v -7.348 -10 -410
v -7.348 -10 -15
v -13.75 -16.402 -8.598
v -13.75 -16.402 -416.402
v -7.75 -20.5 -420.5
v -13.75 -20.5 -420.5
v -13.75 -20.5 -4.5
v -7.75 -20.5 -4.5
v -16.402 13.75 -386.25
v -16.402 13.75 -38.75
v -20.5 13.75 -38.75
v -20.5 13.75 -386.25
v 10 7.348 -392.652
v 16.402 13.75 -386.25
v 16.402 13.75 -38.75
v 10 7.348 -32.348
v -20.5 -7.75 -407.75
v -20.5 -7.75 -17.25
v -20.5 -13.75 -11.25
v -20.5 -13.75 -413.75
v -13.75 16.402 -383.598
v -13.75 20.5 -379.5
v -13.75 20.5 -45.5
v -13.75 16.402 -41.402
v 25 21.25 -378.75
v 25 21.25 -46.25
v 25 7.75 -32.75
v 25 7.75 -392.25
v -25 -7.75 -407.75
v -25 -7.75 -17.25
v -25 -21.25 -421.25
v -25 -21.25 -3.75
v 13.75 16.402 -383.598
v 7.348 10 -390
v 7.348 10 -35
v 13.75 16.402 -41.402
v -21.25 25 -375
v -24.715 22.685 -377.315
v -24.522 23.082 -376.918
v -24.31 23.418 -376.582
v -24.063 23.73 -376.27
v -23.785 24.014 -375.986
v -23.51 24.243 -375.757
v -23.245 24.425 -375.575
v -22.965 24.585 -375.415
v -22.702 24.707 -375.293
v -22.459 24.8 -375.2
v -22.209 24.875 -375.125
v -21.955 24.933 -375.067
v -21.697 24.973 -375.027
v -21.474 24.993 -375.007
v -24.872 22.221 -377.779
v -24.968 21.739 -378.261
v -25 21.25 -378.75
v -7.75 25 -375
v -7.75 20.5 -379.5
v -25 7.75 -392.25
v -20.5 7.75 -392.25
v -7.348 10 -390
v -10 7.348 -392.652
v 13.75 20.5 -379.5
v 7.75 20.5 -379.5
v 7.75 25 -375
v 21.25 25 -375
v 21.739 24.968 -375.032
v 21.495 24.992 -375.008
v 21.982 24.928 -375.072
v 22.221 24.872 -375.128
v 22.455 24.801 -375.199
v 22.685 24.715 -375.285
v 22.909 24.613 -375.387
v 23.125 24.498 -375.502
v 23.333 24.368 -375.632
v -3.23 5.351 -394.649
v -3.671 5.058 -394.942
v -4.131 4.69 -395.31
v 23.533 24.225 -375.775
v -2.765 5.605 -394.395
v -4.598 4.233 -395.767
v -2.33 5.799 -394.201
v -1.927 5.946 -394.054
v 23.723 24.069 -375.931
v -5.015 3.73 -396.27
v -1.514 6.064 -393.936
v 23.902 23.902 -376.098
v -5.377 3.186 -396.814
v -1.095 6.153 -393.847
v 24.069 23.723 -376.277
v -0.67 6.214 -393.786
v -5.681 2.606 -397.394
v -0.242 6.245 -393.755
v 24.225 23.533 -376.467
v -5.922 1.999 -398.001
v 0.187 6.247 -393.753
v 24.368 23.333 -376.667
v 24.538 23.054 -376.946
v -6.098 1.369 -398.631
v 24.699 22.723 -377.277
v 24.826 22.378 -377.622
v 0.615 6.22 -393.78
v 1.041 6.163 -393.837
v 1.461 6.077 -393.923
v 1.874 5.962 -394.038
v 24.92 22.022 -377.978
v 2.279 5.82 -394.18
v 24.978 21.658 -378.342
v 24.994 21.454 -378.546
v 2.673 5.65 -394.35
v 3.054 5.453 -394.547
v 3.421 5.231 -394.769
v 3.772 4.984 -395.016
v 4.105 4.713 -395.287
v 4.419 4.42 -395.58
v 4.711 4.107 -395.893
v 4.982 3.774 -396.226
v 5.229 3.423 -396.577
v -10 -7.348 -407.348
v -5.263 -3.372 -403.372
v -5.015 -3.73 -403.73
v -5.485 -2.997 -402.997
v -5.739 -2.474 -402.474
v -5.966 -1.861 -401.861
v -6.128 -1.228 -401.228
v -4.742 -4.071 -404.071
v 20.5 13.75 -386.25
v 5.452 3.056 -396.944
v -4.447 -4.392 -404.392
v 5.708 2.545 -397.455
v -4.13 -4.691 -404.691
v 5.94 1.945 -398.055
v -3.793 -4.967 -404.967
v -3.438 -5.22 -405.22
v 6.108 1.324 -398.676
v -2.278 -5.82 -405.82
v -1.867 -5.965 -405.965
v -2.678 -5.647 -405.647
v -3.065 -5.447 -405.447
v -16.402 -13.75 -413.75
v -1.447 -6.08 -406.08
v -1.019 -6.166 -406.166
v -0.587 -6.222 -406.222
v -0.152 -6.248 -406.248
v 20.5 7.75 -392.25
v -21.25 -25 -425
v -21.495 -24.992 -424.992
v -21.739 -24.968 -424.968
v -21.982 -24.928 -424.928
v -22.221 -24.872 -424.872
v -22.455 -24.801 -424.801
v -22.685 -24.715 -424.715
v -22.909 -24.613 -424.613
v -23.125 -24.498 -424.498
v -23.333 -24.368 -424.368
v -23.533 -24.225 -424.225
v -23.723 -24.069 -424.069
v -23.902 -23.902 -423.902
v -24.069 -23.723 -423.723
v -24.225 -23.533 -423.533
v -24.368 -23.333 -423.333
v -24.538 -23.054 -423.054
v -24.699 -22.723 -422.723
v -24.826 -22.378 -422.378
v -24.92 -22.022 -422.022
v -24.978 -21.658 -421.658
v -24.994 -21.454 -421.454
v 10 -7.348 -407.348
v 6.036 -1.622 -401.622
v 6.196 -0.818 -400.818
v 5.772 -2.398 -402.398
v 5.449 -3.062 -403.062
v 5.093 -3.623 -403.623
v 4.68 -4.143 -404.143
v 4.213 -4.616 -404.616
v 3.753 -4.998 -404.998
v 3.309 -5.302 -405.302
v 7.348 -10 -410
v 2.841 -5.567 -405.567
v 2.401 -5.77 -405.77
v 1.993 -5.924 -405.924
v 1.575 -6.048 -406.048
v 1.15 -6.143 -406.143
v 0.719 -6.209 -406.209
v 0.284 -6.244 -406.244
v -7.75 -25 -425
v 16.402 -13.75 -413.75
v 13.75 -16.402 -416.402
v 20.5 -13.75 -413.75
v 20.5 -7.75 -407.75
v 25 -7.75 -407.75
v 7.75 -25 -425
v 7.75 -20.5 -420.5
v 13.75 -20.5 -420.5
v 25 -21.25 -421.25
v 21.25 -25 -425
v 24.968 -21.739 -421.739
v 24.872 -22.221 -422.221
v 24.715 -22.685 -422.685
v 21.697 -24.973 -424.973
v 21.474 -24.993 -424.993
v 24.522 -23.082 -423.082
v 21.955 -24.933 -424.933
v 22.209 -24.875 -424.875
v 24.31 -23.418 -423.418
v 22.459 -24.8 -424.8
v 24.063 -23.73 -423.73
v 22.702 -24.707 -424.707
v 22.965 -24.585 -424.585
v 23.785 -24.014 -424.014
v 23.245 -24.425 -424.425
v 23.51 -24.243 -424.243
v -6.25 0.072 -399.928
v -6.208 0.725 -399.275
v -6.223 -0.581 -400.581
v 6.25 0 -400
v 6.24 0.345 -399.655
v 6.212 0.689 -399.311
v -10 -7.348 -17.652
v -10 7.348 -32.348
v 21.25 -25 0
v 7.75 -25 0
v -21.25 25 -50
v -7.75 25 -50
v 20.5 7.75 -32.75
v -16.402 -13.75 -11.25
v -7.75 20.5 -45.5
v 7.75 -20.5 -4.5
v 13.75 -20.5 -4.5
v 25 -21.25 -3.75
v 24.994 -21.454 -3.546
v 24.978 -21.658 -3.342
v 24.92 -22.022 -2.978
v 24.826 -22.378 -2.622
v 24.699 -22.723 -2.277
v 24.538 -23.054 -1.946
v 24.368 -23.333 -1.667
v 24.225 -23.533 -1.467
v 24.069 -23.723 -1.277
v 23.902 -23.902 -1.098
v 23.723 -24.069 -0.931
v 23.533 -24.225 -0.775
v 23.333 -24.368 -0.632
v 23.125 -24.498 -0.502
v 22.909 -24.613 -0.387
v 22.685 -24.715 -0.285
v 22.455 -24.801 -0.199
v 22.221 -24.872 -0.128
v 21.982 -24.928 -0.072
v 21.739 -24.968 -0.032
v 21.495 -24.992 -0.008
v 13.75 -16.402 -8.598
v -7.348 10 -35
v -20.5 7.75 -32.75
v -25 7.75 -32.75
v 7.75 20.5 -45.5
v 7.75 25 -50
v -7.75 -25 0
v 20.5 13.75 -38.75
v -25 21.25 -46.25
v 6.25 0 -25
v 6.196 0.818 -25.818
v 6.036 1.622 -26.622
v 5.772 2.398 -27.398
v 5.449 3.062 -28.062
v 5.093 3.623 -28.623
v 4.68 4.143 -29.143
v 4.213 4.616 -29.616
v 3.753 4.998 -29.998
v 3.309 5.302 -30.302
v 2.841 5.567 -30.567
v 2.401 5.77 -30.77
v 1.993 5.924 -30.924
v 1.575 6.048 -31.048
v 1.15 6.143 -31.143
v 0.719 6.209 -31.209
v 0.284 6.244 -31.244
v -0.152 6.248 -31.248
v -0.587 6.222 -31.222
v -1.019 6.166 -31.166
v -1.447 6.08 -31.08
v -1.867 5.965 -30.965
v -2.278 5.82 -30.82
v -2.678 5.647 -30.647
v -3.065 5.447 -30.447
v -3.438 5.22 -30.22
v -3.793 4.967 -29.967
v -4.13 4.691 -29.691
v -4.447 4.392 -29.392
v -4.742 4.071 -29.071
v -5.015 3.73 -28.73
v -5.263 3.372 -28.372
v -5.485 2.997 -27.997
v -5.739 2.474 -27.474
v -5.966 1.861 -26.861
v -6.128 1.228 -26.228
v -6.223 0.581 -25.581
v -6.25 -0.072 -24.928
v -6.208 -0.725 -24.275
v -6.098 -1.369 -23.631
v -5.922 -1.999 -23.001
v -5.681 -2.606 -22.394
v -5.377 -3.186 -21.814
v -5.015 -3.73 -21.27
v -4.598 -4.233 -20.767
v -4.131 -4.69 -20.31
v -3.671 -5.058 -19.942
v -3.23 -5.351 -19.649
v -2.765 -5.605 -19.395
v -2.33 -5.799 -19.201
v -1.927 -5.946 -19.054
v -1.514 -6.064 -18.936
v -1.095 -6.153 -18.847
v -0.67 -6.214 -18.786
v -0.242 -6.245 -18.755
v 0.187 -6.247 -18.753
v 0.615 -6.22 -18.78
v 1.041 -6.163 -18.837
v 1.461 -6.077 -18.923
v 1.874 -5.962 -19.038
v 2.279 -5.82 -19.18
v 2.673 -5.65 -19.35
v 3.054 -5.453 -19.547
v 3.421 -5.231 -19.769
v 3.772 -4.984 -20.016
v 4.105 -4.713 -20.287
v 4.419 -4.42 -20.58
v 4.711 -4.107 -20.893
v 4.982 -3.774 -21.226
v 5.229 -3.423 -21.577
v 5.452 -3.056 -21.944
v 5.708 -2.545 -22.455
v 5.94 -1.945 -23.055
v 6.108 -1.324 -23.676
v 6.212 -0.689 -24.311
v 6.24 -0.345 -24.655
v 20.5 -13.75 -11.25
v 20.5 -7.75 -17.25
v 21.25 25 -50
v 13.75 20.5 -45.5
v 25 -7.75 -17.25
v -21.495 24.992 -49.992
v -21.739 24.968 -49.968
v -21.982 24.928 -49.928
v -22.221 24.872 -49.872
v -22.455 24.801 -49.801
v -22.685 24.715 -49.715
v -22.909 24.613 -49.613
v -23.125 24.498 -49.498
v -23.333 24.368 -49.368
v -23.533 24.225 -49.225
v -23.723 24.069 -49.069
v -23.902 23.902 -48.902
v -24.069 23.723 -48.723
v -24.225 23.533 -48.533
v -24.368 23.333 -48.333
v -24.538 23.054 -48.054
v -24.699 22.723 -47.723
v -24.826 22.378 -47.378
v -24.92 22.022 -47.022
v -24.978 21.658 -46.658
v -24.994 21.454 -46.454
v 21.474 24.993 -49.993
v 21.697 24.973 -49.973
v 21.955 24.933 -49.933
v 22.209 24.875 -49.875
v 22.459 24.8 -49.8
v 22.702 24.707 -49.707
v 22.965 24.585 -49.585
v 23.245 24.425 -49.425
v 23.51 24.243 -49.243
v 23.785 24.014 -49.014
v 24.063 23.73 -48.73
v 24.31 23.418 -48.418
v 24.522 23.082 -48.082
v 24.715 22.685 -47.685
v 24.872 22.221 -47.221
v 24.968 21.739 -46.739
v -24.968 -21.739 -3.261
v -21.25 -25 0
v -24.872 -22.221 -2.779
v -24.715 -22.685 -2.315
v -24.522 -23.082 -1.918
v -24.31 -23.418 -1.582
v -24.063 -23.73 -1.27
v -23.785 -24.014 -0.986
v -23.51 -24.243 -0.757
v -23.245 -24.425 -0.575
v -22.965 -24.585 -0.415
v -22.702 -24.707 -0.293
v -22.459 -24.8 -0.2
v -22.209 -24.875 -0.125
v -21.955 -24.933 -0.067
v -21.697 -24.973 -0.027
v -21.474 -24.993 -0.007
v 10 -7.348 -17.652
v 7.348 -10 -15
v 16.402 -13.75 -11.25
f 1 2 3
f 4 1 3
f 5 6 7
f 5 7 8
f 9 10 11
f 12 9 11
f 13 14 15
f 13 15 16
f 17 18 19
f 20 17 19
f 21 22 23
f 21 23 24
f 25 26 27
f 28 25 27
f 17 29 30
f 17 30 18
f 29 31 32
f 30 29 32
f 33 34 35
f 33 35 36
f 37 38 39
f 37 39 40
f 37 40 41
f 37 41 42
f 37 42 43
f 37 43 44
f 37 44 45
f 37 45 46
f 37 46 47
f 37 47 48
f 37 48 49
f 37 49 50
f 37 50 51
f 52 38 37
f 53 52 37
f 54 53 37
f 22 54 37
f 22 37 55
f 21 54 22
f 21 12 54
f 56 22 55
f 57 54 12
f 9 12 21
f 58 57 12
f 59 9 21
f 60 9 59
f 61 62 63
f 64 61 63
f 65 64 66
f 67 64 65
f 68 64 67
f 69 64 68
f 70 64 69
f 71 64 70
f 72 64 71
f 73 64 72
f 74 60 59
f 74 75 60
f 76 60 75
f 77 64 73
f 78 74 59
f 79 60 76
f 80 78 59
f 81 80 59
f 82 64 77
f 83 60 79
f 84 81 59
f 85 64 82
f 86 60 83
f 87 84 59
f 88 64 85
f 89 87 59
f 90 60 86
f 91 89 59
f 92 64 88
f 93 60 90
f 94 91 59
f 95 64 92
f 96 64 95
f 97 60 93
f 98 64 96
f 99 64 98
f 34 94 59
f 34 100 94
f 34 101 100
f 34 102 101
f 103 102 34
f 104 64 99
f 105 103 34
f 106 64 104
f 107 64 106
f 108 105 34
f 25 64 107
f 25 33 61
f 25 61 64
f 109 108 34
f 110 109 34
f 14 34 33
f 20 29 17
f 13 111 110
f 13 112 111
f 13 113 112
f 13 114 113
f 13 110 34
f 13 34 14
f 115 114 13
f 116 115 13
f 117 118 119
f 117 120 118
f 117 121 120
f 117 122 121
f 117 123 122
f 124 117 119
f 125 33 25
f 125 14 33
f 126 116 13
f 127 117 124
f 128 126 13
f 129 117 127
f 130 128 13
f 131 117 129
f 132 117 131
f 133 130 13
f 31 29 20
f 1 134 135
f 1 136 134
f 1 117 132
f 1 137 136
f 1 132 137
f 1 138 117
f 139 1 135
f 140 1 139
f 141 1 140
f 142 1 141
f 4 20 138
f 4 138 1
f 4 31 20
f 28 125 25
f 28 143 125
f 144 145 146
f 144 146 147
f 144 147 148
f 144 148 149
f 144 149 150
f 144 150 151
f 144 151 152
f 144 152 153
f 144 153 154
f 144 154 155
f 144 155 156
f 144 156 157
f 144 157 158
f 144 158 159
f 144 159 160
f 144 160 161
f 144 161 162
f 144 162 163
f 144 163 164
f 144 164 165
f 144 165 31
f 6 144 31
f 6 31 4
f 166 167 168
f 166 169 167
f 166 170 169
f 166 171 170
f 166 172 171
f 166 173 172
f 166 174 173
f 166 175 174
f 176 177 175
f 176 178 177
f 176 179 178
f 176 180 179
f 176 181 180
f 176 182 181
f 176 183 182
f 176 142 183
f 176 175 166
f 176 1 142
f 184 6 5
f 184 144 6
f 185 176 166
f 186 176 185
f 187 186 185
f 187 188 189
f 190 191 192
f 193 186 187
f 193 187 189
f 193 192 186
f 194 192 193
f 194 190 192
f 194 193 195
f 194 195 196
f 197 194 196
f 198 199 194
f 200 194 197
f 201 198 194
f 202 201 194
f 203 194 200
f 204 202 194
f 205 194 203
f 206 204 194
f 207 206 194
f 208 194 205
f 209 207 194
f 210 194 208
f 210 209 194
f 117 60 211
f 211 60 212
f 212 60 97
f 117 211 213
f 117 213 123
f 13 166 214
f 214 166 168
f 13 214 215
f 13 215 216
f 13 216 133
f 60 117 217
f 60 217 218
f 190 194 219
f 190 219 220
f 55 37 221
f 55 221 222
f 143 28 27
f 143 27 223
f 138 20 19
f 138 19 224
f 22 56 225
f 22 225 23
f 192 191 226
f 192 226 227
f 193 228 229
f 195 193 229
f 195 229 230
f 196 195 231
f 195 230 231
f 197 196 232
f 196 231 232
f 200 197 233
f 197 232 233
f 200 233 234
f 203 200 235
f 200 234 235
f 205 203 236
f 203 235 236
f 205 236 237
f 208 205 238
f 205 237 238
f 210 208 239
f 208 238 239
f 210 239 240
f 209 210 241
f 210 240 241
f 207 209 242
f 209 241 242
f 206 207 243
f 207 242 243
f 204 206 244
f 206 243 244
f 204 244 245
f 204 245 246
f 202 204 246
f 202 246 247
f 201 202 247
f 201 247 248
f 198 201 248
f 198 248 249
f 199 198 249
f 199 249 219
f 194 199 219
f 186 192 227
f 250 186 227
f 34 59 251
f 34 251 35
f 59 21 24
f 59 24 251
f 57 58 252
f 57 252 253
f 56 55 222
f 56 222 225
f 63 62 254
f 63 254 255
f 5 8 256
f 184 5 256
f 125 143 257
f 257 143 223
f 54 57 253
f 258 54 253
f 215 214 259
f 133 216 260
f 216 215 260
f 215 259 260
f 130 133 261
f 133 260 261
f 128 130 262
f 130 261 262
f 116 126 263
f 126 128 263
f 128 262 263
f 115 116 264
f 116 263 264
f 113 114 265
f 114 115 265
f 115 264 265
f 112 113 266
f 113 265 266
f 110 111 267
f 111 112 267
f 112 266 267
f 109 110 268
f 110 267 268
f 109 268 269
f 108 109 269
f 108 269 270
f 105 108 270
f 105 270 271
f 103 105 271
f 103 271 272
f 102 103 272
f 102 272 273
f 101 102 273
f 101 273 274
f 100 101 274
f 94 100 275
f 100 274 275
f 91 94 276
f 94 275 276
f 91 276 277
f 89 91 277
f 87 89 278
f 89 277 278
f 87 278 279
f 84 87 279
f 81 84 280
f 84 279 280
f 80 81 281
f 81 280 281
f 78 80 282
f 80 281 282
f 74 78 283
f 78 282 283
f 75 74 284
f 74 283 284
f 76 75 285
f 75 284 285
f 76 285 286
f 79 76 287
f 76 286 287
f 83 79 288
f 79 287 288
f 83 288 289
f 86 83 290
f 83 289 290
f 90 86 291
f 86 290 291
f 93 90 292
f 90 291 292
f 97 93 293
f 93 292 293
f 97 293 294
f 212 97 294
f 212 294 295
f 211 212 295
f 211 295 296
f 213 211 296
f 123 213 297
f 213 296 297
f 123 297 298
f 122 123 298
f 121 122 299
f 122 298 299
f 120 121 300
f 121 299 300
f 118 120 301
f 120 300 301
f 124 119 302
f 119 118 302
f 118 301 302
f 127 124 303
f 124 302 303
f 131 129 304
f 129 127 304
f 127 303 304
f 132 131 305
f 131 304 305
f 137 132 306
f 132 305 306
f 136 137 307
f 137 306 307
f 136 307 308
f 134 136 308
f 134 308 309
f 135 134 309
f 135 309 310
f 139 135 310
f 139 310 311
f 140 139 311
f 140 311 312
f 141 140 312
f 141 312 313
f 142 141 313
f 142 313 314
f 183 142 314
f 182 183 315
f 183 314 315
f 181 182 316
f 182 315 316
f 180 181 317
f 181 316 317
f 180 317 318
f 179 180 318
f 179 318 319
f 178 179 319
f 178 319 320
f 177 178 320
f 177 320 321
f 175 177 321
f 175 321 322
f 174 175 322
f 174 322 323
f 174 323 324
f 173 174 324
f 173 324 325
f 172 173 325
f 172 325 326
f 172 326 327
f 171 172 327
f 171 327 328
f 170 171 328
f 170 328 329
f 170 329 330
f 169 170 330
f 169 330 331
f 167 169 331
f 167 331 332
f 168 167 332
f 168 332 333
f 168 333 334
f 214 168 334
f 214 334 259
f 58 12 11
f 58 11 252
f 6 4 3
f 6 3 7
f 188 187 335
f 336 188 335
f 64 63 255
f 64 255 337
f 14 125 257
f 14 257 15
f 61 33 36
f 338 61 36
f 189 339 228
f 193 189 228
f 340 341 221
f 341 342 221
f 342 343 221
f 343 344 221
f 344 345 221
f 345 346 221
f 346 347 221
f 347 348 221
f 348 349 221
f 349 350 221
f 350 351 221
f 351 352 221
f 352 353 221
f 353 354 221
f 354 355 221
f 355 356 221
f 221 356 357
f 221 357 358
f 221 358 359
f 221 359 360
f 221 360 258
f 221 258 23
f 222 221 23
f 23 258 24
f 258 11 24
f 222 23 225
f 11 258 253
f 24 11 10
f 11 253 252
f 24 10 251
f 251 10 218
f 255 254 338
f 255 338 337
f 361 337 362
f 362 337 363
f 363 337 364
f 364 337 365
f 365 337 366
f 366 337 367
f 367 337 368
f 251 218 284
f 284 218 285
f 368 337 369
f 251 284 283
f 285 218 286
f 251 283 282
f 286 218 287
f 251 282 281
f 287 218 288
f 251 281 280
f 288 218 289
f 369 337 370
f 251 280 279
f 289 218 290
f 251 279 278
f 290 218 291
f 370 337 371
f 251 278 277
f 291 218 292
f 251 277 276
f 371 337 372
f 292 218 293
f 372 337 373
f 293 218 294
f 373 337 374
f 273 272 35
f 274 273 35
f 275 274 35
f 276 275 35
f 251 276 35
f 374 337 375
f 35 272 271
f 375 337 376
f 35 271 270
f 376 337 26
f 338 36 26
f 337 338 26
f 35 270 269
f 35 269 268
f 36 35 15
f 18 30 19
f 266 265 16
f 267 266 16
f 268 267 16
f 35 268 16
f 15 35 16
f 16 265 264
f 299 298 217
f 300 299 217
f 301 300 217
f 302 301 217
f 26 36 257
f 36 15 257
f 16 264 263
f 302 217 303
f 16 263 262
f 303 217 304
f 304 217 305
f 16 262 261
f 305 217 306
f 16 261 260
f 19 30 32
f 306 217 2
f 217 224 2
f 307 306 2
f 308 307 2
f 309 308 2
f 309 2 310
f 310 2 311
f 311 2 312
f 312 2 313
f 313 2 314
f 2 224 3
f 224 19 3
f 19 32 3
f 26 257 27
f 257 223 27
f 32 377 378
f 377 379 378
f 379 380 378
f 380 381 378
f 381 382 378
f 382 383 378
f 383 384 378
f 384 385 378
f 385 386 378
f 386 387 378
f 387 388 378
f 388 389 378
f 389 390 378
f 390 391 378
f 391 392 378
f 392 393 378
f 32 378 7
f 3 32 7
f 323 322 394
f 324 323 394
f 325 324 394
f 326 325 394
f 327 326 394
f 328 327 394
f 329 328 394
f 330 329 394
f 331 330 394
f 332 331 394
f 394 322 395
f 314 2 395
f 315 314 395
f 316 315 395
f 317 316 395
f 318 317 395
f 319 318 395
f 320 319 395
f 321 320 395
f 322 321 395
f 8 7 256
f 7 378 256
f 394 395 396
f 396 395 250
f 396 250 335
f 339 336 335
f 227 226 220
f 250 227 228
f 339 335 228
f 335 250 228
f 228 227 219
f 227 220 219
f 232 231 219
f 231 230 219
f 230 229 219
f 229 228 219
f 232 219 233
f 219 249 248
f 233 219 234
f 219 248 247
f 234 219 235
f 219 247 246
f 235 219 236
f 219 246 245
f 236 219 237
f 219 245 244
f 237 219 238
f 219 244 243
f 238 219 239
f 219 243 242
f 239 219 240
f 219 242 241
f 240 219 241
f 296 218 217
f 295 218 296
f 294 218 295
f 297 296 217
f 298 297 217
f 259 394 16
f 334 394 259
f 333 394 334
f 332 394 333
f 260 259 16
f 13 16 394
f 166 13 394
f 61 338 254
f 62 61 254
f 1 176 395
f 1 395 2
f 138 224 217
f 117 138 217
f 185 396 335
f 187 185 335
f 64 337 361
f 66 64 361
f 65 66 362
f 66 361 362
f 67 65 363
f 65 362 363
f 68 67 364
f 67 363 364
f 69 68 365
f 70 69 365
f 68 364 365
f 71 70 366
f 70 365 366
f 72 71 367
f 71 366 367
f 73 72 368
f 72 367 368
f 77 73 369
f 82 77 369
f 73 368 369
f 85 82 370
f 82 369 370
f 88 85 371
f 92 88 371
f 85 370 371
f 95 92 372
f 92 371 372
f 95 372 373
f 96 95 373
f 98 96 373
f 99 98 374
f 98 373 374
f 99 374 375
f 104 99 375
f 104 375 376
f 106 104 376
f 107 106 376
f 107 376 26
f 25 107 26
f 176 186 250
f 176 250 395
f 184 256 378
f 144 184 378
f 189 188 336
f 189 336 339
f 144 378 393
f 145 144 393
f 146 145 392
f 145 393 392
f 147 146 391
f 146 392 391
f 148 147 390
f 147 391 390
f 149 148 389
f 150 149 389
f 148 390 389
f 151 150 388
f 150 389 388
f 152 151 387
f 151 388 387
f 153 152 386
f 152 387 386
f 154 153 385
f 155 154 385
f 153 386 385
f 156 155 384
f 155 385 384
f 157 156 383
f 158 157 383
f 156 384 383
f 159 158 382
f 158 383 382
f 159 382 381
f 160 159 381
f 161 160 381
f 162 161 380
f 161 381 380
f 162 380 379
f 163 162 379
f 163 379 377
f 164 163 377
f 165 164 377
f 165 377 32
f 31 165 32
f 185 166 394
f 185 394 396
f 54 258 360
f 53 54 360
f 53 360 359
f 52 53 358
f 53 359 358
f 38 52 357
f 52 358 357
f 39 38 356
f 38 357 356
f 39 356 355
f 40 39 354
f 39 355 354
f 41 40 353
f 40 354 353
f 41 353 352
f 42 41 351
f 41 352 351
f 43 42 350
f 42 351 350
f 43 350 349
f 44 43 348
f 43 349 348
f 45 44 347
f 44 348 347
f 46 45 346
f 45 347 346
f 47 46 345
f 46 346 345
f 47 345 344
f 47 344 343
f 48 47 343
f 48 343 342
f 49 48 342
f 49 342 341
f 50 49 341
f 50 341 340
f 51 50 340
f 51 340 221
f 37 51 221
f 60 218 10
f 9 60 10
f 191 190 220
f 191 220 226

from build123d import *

# Parameters (mm, degrees)
SKETCH_1_R         = 2.5
EXTRUDE_2_DEPTH    = 170
SCALE1_SCALE       = 2.5
SKETCH1_W          = 66.249560654
SKETCH1_H          = 85.957176857
CUT_EXTRUDE1_DEPTH = 50


with BuildPart() as part:
    # 草图1 → 凸台-拉伸2 (new body)
    with BuildSketch(Plane.XY):
        with BuildLine():
            Line((5.5, -8.2), (5.5, -6.560660172))
            Line((5.5, -6.560660172), (2.939339828, -4))
            Line((2.939339828, -4), (-2.939339828, -4))
            Line((-2.939339828, -4), (-5.5, -6.560660172))
            Line((-5.5, -6.560660172), (-5.5, -8.2))
            Line((-5.5, -8.2), (-3.1, -8.2))
            Line((-3.1, -8.2), (-3.1, -10))
            Line((-3.1, -10), (-8.5, -10))
            ThreePointArc((-8.5, -10), (-9.560660172, -9.560660172), (-10, -8.5))
            Line((-10, -8.5), (-10, -3.1))
            Line((-10, -3.1), (-8.2, -3.1))
            Line((-8.2, -3.1), (-8.2, -5.5))
            Line((-8.2, -5.5), (-6.560660172, -5.5))
            Line((-6.560660172, -5.5), (-4, -2.939339828))
            Line((-4, -2.939339828), (-4, 2.939339828))
            Line((-4, 2.939339828), (-6.560660172, 5.5))
            Line((-6.560660172, 5.5), (-8.2, 5.5))
            Line((-8.2, 5.5), (-8.2, 3.1))
            Line((-8.2, 3.1), (-10, 3.1))
            Line((-10, 3.1), (-10, 8.5))
            ThreePointArc((-10, 8.5), (-9.560660172, 9.560660172), (-8.5, 10))
            Line((-8.5, 10), (-3.1, 10))
            Line((-3.1, 10), (-3.1, 8.2))
            Line((-3.1, 8.2), (-5.5, 8.2))
            Line((-5.5, 8.2), (-5.5, 6.560660172))
            Line((-5.5, 6.560660172), (-2.939339828, 4))
            Line((-2.939339828, 4), (2.939339828, 4))
            Line((2.939339828, 4), (5.5, 6.560660172))
            Line((5.5, 6.560660172), (5.5, 8.2))
            Line((5.5, 8.2), (3.1, 8.2))
            Line((3.1, 8.2), (3.1, 10))
            Line((3.1, 10), (8.5, 10))
            ThreePointArc((8.5, 10), (9.560660172, 9.560660172), (10, 8.5))
            Line((10, 8.5), (10, 3.1))
            Line((10, 3.1), (8.2, 3.1))
            Line((8.2, 3.1), (8.2, 5.5))
            Line((8.2, 5.5), (6.560660172, 5.5))
            Line((6.560660172, 5.5), (4, 2.939339828))
            Line((4, 2.939339828), (4, -2.939339828))
            Line((4, -2.939339828), (6.560660172, -5.5))
            Line((6.560660172, -5.5), (8.2, -5.5))
            Line((8.2, -5.5), (8.2, -3.1))
            Line((8.2, -3.1), (10, -3.1))
            Line((10, -3.1), (10, -8.5))
            ThreePointArc((10, -8.5), (9.560660172, -9.560660172), (8.5, -10))
            Line((8.5, -10), (3.1, -10))
            Line((3.1, -10), (3.1, -8.2))
            Line((3.1, -8.2), (5.5, -8.2))
        make_face()
        Circle(SKETCH_1_R, mode=Mode.SUBTRACT)
    extrude(amount=-EXTRUDE_2_DEPTH)


with BuildPart() as part_1:
    # Scale1: scaled about (0, 0, 0)
    add(part.part.scale(SCALE1_SCALE))

    # Sketch1 → Cut-Extrude1 (cut)
    with BuildSketch(Plane(origin=(0, 200, -200), x_dir=(1, 0, 0), z_dir=(1.0176525195173148e-14, 0.7071067811865488, -0.7071067811865464))):
        with Locations((1.305108883, 276.28516192)):
            Rectangle(SKETCH1_W, SKETCH1_H)
    cut_extrude1 = extrude(amount=CUT_EXTRUDE1_DEPTH, mode=Mode.SUBTRACT)

    # Mirror1: Cut-Extrude1 across plane
    add(cut_extrude1.mirror(Plane.XY.offset(-212.5)), mode=Mode.SUBTRACT)


solid = part_1.part
